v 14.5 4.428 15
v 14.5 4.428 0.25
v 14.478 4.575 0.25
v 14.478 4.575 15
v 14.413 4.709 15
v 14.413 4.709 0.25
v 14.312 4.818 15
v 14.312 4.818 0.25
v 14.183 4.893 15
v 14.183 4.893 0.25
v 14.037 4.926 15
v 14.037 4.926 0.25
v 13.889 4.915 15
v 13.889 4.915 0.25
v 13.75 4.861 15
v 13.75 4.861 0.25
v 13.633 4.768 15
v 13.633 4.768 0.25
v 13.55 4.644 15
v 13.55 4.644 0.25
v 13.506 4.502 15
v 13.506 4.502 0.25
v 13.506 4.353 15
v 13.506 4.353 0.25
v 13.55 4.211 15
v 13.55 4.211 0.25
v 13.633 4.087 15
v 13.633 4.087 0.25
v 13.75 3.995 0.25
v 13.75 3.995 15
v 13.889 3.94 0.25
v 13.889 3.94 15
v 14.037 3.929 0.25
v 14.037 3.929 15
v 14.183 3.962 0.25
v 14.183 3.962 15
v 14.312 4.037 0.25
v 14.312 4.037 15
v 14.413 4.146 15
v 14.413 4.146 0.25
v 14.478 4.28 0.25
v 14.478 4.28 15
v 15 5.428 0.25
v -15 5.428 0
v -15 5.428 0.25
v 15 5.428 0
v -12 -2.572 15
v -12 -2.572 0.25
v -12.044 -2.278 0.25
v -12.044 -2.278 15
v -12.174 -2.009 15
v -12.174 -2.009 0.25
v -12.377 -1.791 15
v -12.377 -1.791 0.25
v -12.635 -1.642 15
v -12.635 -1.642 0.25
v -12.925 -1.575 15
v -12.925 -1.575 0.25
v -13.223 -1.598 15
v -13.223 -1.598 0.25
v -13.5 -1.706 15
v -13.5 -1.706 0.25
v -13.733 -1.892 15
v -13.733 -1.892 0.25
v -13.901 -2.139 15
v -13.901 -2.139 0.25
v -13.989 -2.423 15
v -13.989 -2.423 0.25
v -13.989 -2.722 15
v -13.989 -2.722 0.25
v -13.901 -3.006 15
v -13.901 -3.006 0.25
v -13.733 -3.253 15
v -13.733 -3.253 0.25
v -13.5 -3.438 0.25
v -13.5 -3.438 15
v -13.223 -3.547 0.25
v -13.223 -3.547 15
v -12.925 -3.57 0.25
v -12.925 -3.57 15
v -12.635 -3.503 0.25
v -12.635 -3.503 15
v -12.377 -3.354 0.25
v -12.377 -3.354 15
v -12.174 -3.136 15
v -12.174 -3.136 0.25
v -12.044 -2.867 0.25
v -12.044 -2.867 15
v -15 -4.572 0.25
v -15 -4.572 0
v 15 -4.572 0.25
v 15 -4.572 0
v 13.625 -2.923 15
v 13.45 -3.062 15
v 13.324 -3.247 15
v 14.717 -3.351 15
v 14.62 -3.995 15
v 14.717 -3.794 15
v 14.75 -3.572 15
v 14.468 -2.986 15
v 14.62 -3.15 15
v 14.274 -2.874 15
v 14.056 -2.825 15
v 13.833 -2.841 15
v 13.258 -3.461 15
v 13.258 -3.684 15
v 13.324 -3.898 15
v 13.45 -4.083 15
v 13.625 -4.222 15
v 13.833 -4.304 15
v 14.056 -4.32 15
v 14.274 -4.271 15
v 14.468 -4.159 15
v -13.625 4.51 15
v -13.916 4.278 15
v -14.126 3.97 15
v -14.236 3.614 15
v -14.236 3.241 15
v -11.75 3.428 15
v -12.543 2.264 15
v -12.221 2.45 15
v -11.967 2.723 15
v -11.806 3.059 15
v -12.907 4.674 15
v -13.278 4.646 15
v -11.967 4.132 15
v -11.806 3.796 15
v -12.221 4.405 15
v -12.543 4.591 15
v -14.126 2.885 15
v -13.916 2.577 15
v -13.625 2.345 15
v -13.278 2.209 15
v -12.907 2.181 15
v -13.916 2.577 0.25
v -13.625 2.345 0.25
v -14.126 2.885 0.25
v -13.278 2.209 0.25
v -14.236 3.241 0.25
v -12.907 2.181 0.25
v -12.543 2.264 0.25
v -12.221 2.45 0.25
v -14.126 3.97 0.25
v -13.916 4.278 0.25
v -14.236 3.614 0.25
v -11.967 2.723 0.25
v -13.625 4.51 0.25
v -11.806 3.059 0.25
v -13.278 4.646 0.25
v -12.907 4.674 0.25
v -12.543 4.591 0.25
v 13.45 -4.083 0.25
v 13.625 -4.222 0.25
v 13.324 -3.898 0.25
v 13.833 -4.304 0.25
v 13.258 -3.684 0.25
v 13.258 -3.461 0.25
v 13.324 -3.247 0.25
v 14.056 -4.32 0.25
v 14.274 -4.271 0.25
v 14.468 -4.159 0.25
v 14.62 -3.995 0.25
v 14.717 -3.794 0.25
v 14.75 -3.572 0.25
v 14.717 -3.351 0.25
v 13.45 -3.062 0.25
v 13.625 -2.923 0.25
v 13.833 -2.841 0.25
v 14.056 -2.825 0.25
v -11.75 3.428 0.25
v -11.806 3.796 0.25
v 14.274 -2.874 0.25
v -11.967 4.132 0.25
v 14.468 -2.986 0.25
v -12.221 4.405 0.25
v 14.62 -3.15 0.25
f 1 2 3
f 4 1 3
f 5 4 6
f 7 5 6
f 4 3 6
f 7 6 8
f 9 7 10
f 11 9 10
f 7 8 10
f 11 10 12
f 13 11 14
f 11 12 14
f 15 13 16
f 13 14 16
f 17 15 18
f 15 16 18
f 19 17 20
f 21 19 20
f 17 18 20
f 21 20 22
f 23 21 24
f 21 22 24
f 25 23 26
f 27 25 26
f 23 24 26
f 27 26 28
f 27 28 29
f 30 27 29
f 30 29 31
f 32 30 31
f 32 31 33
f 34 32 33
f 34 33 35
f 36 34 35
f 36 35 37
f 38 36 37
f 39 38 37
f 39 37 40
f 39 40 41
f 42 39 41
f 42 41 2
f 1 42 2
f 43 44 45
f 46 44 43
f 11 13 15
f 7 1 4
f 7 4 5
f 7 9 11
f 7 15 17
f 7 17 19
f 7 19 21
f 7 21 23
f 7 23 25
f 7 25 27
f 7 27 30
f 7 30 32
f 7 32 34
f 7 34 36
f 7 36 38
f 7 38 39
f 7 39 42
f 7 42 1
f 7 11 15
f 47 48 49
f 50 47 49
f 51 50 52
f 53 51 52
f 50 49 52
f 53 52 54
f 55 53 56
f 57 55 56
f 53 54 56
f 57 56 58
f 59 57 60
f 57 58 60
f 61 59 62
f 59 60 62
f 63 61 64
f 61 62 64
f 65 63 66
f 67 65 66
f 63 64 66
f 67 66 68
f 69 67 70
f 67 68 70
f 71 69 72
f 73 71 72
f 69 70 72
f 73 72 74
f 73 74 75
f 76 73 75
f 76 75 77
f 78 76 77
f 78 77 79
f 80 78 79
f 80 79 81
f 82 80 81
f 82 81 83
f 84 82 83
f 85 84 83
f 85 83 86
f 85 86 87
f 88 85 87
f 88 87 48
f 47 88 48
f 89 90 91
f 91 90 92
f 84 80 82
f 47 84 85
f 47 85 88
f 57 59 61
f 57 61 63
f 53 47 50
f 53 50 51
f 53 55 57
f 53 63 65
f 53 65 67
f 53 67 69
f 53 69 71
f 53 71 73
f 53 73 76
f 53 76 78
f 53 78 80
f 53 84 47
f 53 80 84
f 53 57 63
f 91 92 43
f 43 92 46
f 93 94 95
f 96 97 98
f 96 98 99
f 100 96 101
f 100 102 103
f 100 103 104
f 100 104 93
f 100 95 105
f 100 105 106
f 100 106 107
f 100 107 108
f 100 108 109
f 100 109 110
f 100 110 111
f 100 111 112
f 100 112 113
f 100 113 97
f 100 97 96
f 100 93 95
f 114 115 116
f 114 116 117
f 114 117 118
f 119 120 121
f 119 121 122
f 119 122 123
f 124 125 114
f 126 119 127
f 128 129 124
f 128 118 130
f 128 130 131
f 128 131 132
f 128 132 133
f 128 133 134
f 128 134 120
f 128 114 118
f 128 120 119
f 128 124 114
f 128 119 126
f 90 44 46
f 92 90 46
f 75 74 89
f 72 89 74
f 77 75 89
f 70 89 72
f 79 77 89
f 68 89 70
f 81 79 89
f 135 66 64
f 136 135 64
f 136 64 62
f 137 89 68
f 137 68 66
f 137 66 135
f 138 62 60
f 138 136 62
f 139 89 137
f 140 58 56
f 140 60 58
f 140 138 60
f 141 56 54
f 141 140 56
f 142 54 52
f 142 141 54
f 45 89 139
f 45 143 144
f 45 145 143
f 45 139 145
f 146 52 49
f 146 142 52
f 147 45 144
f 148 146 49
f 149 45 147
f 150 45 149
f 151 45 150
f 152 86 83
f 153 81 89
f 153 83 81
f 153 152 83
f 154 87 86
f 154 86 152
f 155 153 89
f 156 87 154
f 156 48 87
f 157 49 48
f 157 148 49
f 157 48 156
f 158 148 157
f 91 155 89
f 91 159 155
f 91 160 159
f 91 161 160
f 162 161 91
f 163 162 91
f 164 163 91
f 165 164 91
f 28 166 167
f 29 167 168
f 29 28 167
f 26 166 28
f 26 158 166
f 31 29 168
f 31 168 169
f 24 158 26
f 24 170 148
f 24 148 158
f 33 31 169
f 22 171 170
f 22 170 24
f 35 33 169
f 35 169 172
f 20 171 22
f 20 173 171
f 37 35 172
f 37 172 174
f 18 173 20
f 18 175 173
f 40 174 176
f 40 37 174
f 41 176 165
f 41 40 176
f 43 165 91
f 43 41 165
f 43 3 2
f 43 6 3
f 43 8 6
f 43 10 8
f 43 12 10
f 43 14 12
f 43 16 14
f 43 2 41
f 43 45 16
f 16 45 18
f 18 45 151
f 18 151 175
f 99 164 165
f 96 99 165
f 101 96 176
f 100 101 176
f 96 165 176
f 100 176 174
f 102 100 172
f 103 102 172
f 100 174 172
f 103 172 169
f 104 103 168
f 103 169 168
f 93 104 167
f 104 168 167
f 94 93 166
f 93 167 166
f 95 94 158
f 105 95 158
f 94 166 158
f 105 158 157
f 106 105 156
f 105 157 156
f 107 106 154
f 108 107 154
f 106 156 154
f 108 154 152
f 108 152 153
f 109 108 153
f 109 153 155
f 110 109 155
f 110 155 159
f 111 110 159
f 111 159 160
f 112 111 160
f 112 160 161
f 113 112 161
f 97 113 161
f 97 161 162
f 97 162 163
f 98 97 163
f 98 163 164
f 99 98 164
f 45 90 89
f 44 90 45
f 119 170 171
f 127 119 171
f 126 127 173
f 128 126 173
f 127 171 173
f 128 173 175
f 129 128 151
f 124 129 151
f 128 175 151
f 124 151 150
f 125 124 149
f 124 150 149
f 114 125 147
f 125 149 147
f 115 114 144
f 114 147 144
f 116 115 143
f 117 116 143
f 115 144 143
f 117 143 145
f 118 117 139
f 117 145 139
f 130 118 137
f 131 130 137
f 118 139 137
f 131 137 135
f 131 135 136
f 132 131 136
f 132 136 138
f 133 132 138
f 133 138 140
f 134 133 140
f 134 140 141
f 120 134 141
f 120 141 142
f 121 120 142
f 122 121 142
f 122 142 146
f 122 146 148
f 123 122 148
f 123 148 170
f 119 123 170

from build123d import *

# Parameters (mm, degrees)
F0_W     = 30
F0_H     = 10
F0_R     = 1
F0_R_2   = 0.75
F0_R_3   = 1.25
F0_R_4   = 0.5
F1_DEPTH = 0.25
F2_DEPTH = 15


with BuildPart() as f1:
    # F0 (on Top) → F1 (new body)
    with BuildSketch(Plane.XY):
        with Locations((0, 0.427538)):
            Rectangle(F0_W, F0_H)
        with Locations((-13, -2.572462)):
            Circle(F0_R, mode=Mode.SUBTRACT)
        with Locations((14, -3.572462)):
            Circle(F0_R_2, mode=Mode.SUBTRACT)
        with Locations((-13, 3.427538)):
            Circle(F0_R_3, mode=Mode.SUBTRACT)
        with Locations((14, 4.427538)):
            Circle(F0_R_4, mode=Mode.SUBTRACT)
    extrude(amount=F1_DEPTH)

    # F0 (on Top) → F2 (join)
    with BuildSketch(Plane.XY):
        with Locations((-13, 3.427538)):
            Circle(F0_R_3)
        with Locations((-13, -2.572462)):
            Circle(F0_R)
        with Locations((14, -3.572462)):
            Circle(F0_R_2)
        with Locations((14, 4.427538)):
            Circle(F0_R_4)
    extrude(amount=F2_DEPTH)


solid = f1.part
